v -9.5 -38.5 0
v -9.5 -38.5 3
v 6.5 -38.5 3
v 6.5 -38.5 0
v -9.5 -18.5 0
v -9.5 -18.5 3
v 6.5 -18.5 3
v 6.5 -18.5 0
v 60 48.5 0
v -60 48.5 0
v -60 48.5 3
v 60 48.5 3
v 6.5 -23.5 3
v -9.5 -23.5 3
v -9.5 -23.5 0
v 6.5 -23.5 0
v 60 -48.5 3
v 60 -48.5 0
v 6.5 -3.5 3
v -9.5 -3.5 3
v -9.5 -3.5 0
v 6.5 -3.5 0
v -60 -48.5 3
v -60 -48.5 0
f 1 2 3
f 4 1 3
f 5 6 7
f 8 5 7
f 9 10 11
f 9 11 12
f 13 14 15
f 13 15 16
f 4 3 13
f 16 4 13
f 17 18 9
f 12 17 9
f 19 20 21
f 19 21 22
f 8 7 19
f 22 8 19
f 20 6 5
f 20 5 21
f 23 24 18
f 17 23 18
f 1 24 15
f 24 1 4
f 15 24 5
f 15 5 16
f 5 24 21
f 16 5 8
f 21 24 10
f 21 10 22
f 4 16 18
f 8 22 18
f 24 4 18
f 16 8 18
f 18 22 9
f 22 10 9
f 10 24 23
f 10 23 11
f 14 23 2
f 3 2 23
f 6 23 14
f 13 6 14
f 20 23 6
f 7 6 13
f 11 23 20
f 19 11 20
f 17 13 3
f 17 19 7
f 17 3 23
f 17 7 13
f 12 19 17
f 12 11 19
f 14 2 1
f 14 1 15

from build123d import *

# Parameters (mm, degrees)
ESBO_O1_W                = 120
ESBO_O1_H                = 97
RESSALTO_EXTRUS_O1_DEPTH = 3
ESBO_O2_W                = 16
ESBO_O2_H                = 15
CORTE_EXTRUS_O1_DEPTH    = 78.209131584
PADR_O_LINEAR1_COUNT     = 2
PADR_O_LINEAR1_PITCH     = 20


with BuildPart() as part:
    # Esboço1 → Ressalto-extrusão1 (new body)
    with BuildSketch(Plane.XY):
        Rectangle(ESBO_O1_W, ESBO_O1_H)
    extrude(amount=RESSALTO_EXTRUS_O1_DEPTH)

    # Esboço2 → Corte-extrusão1 (cut, through all)
    with BuildSketch(Plane.XY.offset(3)):
        with Locations((-1.5, -31)):
            Rectangle(ESBO_O2_W, ESBO_O2_H)
    corte_extrus_o1 = extrude(amount=-CORTE_EXTRUS_O1_DEPTH, mode=Mode.SUBTRACT)

    # Padrão linear1: Corte-extrusão1 ×2
    with Locations(*[(0, i * PADR_O_LINEAR1_PITCH, 0) for i in range(1, PADR_O_LINEAR1_COUNT)]):
        add(corte_extrus_o1, mode=Mode.SUBTRACT)


solid = part.part
